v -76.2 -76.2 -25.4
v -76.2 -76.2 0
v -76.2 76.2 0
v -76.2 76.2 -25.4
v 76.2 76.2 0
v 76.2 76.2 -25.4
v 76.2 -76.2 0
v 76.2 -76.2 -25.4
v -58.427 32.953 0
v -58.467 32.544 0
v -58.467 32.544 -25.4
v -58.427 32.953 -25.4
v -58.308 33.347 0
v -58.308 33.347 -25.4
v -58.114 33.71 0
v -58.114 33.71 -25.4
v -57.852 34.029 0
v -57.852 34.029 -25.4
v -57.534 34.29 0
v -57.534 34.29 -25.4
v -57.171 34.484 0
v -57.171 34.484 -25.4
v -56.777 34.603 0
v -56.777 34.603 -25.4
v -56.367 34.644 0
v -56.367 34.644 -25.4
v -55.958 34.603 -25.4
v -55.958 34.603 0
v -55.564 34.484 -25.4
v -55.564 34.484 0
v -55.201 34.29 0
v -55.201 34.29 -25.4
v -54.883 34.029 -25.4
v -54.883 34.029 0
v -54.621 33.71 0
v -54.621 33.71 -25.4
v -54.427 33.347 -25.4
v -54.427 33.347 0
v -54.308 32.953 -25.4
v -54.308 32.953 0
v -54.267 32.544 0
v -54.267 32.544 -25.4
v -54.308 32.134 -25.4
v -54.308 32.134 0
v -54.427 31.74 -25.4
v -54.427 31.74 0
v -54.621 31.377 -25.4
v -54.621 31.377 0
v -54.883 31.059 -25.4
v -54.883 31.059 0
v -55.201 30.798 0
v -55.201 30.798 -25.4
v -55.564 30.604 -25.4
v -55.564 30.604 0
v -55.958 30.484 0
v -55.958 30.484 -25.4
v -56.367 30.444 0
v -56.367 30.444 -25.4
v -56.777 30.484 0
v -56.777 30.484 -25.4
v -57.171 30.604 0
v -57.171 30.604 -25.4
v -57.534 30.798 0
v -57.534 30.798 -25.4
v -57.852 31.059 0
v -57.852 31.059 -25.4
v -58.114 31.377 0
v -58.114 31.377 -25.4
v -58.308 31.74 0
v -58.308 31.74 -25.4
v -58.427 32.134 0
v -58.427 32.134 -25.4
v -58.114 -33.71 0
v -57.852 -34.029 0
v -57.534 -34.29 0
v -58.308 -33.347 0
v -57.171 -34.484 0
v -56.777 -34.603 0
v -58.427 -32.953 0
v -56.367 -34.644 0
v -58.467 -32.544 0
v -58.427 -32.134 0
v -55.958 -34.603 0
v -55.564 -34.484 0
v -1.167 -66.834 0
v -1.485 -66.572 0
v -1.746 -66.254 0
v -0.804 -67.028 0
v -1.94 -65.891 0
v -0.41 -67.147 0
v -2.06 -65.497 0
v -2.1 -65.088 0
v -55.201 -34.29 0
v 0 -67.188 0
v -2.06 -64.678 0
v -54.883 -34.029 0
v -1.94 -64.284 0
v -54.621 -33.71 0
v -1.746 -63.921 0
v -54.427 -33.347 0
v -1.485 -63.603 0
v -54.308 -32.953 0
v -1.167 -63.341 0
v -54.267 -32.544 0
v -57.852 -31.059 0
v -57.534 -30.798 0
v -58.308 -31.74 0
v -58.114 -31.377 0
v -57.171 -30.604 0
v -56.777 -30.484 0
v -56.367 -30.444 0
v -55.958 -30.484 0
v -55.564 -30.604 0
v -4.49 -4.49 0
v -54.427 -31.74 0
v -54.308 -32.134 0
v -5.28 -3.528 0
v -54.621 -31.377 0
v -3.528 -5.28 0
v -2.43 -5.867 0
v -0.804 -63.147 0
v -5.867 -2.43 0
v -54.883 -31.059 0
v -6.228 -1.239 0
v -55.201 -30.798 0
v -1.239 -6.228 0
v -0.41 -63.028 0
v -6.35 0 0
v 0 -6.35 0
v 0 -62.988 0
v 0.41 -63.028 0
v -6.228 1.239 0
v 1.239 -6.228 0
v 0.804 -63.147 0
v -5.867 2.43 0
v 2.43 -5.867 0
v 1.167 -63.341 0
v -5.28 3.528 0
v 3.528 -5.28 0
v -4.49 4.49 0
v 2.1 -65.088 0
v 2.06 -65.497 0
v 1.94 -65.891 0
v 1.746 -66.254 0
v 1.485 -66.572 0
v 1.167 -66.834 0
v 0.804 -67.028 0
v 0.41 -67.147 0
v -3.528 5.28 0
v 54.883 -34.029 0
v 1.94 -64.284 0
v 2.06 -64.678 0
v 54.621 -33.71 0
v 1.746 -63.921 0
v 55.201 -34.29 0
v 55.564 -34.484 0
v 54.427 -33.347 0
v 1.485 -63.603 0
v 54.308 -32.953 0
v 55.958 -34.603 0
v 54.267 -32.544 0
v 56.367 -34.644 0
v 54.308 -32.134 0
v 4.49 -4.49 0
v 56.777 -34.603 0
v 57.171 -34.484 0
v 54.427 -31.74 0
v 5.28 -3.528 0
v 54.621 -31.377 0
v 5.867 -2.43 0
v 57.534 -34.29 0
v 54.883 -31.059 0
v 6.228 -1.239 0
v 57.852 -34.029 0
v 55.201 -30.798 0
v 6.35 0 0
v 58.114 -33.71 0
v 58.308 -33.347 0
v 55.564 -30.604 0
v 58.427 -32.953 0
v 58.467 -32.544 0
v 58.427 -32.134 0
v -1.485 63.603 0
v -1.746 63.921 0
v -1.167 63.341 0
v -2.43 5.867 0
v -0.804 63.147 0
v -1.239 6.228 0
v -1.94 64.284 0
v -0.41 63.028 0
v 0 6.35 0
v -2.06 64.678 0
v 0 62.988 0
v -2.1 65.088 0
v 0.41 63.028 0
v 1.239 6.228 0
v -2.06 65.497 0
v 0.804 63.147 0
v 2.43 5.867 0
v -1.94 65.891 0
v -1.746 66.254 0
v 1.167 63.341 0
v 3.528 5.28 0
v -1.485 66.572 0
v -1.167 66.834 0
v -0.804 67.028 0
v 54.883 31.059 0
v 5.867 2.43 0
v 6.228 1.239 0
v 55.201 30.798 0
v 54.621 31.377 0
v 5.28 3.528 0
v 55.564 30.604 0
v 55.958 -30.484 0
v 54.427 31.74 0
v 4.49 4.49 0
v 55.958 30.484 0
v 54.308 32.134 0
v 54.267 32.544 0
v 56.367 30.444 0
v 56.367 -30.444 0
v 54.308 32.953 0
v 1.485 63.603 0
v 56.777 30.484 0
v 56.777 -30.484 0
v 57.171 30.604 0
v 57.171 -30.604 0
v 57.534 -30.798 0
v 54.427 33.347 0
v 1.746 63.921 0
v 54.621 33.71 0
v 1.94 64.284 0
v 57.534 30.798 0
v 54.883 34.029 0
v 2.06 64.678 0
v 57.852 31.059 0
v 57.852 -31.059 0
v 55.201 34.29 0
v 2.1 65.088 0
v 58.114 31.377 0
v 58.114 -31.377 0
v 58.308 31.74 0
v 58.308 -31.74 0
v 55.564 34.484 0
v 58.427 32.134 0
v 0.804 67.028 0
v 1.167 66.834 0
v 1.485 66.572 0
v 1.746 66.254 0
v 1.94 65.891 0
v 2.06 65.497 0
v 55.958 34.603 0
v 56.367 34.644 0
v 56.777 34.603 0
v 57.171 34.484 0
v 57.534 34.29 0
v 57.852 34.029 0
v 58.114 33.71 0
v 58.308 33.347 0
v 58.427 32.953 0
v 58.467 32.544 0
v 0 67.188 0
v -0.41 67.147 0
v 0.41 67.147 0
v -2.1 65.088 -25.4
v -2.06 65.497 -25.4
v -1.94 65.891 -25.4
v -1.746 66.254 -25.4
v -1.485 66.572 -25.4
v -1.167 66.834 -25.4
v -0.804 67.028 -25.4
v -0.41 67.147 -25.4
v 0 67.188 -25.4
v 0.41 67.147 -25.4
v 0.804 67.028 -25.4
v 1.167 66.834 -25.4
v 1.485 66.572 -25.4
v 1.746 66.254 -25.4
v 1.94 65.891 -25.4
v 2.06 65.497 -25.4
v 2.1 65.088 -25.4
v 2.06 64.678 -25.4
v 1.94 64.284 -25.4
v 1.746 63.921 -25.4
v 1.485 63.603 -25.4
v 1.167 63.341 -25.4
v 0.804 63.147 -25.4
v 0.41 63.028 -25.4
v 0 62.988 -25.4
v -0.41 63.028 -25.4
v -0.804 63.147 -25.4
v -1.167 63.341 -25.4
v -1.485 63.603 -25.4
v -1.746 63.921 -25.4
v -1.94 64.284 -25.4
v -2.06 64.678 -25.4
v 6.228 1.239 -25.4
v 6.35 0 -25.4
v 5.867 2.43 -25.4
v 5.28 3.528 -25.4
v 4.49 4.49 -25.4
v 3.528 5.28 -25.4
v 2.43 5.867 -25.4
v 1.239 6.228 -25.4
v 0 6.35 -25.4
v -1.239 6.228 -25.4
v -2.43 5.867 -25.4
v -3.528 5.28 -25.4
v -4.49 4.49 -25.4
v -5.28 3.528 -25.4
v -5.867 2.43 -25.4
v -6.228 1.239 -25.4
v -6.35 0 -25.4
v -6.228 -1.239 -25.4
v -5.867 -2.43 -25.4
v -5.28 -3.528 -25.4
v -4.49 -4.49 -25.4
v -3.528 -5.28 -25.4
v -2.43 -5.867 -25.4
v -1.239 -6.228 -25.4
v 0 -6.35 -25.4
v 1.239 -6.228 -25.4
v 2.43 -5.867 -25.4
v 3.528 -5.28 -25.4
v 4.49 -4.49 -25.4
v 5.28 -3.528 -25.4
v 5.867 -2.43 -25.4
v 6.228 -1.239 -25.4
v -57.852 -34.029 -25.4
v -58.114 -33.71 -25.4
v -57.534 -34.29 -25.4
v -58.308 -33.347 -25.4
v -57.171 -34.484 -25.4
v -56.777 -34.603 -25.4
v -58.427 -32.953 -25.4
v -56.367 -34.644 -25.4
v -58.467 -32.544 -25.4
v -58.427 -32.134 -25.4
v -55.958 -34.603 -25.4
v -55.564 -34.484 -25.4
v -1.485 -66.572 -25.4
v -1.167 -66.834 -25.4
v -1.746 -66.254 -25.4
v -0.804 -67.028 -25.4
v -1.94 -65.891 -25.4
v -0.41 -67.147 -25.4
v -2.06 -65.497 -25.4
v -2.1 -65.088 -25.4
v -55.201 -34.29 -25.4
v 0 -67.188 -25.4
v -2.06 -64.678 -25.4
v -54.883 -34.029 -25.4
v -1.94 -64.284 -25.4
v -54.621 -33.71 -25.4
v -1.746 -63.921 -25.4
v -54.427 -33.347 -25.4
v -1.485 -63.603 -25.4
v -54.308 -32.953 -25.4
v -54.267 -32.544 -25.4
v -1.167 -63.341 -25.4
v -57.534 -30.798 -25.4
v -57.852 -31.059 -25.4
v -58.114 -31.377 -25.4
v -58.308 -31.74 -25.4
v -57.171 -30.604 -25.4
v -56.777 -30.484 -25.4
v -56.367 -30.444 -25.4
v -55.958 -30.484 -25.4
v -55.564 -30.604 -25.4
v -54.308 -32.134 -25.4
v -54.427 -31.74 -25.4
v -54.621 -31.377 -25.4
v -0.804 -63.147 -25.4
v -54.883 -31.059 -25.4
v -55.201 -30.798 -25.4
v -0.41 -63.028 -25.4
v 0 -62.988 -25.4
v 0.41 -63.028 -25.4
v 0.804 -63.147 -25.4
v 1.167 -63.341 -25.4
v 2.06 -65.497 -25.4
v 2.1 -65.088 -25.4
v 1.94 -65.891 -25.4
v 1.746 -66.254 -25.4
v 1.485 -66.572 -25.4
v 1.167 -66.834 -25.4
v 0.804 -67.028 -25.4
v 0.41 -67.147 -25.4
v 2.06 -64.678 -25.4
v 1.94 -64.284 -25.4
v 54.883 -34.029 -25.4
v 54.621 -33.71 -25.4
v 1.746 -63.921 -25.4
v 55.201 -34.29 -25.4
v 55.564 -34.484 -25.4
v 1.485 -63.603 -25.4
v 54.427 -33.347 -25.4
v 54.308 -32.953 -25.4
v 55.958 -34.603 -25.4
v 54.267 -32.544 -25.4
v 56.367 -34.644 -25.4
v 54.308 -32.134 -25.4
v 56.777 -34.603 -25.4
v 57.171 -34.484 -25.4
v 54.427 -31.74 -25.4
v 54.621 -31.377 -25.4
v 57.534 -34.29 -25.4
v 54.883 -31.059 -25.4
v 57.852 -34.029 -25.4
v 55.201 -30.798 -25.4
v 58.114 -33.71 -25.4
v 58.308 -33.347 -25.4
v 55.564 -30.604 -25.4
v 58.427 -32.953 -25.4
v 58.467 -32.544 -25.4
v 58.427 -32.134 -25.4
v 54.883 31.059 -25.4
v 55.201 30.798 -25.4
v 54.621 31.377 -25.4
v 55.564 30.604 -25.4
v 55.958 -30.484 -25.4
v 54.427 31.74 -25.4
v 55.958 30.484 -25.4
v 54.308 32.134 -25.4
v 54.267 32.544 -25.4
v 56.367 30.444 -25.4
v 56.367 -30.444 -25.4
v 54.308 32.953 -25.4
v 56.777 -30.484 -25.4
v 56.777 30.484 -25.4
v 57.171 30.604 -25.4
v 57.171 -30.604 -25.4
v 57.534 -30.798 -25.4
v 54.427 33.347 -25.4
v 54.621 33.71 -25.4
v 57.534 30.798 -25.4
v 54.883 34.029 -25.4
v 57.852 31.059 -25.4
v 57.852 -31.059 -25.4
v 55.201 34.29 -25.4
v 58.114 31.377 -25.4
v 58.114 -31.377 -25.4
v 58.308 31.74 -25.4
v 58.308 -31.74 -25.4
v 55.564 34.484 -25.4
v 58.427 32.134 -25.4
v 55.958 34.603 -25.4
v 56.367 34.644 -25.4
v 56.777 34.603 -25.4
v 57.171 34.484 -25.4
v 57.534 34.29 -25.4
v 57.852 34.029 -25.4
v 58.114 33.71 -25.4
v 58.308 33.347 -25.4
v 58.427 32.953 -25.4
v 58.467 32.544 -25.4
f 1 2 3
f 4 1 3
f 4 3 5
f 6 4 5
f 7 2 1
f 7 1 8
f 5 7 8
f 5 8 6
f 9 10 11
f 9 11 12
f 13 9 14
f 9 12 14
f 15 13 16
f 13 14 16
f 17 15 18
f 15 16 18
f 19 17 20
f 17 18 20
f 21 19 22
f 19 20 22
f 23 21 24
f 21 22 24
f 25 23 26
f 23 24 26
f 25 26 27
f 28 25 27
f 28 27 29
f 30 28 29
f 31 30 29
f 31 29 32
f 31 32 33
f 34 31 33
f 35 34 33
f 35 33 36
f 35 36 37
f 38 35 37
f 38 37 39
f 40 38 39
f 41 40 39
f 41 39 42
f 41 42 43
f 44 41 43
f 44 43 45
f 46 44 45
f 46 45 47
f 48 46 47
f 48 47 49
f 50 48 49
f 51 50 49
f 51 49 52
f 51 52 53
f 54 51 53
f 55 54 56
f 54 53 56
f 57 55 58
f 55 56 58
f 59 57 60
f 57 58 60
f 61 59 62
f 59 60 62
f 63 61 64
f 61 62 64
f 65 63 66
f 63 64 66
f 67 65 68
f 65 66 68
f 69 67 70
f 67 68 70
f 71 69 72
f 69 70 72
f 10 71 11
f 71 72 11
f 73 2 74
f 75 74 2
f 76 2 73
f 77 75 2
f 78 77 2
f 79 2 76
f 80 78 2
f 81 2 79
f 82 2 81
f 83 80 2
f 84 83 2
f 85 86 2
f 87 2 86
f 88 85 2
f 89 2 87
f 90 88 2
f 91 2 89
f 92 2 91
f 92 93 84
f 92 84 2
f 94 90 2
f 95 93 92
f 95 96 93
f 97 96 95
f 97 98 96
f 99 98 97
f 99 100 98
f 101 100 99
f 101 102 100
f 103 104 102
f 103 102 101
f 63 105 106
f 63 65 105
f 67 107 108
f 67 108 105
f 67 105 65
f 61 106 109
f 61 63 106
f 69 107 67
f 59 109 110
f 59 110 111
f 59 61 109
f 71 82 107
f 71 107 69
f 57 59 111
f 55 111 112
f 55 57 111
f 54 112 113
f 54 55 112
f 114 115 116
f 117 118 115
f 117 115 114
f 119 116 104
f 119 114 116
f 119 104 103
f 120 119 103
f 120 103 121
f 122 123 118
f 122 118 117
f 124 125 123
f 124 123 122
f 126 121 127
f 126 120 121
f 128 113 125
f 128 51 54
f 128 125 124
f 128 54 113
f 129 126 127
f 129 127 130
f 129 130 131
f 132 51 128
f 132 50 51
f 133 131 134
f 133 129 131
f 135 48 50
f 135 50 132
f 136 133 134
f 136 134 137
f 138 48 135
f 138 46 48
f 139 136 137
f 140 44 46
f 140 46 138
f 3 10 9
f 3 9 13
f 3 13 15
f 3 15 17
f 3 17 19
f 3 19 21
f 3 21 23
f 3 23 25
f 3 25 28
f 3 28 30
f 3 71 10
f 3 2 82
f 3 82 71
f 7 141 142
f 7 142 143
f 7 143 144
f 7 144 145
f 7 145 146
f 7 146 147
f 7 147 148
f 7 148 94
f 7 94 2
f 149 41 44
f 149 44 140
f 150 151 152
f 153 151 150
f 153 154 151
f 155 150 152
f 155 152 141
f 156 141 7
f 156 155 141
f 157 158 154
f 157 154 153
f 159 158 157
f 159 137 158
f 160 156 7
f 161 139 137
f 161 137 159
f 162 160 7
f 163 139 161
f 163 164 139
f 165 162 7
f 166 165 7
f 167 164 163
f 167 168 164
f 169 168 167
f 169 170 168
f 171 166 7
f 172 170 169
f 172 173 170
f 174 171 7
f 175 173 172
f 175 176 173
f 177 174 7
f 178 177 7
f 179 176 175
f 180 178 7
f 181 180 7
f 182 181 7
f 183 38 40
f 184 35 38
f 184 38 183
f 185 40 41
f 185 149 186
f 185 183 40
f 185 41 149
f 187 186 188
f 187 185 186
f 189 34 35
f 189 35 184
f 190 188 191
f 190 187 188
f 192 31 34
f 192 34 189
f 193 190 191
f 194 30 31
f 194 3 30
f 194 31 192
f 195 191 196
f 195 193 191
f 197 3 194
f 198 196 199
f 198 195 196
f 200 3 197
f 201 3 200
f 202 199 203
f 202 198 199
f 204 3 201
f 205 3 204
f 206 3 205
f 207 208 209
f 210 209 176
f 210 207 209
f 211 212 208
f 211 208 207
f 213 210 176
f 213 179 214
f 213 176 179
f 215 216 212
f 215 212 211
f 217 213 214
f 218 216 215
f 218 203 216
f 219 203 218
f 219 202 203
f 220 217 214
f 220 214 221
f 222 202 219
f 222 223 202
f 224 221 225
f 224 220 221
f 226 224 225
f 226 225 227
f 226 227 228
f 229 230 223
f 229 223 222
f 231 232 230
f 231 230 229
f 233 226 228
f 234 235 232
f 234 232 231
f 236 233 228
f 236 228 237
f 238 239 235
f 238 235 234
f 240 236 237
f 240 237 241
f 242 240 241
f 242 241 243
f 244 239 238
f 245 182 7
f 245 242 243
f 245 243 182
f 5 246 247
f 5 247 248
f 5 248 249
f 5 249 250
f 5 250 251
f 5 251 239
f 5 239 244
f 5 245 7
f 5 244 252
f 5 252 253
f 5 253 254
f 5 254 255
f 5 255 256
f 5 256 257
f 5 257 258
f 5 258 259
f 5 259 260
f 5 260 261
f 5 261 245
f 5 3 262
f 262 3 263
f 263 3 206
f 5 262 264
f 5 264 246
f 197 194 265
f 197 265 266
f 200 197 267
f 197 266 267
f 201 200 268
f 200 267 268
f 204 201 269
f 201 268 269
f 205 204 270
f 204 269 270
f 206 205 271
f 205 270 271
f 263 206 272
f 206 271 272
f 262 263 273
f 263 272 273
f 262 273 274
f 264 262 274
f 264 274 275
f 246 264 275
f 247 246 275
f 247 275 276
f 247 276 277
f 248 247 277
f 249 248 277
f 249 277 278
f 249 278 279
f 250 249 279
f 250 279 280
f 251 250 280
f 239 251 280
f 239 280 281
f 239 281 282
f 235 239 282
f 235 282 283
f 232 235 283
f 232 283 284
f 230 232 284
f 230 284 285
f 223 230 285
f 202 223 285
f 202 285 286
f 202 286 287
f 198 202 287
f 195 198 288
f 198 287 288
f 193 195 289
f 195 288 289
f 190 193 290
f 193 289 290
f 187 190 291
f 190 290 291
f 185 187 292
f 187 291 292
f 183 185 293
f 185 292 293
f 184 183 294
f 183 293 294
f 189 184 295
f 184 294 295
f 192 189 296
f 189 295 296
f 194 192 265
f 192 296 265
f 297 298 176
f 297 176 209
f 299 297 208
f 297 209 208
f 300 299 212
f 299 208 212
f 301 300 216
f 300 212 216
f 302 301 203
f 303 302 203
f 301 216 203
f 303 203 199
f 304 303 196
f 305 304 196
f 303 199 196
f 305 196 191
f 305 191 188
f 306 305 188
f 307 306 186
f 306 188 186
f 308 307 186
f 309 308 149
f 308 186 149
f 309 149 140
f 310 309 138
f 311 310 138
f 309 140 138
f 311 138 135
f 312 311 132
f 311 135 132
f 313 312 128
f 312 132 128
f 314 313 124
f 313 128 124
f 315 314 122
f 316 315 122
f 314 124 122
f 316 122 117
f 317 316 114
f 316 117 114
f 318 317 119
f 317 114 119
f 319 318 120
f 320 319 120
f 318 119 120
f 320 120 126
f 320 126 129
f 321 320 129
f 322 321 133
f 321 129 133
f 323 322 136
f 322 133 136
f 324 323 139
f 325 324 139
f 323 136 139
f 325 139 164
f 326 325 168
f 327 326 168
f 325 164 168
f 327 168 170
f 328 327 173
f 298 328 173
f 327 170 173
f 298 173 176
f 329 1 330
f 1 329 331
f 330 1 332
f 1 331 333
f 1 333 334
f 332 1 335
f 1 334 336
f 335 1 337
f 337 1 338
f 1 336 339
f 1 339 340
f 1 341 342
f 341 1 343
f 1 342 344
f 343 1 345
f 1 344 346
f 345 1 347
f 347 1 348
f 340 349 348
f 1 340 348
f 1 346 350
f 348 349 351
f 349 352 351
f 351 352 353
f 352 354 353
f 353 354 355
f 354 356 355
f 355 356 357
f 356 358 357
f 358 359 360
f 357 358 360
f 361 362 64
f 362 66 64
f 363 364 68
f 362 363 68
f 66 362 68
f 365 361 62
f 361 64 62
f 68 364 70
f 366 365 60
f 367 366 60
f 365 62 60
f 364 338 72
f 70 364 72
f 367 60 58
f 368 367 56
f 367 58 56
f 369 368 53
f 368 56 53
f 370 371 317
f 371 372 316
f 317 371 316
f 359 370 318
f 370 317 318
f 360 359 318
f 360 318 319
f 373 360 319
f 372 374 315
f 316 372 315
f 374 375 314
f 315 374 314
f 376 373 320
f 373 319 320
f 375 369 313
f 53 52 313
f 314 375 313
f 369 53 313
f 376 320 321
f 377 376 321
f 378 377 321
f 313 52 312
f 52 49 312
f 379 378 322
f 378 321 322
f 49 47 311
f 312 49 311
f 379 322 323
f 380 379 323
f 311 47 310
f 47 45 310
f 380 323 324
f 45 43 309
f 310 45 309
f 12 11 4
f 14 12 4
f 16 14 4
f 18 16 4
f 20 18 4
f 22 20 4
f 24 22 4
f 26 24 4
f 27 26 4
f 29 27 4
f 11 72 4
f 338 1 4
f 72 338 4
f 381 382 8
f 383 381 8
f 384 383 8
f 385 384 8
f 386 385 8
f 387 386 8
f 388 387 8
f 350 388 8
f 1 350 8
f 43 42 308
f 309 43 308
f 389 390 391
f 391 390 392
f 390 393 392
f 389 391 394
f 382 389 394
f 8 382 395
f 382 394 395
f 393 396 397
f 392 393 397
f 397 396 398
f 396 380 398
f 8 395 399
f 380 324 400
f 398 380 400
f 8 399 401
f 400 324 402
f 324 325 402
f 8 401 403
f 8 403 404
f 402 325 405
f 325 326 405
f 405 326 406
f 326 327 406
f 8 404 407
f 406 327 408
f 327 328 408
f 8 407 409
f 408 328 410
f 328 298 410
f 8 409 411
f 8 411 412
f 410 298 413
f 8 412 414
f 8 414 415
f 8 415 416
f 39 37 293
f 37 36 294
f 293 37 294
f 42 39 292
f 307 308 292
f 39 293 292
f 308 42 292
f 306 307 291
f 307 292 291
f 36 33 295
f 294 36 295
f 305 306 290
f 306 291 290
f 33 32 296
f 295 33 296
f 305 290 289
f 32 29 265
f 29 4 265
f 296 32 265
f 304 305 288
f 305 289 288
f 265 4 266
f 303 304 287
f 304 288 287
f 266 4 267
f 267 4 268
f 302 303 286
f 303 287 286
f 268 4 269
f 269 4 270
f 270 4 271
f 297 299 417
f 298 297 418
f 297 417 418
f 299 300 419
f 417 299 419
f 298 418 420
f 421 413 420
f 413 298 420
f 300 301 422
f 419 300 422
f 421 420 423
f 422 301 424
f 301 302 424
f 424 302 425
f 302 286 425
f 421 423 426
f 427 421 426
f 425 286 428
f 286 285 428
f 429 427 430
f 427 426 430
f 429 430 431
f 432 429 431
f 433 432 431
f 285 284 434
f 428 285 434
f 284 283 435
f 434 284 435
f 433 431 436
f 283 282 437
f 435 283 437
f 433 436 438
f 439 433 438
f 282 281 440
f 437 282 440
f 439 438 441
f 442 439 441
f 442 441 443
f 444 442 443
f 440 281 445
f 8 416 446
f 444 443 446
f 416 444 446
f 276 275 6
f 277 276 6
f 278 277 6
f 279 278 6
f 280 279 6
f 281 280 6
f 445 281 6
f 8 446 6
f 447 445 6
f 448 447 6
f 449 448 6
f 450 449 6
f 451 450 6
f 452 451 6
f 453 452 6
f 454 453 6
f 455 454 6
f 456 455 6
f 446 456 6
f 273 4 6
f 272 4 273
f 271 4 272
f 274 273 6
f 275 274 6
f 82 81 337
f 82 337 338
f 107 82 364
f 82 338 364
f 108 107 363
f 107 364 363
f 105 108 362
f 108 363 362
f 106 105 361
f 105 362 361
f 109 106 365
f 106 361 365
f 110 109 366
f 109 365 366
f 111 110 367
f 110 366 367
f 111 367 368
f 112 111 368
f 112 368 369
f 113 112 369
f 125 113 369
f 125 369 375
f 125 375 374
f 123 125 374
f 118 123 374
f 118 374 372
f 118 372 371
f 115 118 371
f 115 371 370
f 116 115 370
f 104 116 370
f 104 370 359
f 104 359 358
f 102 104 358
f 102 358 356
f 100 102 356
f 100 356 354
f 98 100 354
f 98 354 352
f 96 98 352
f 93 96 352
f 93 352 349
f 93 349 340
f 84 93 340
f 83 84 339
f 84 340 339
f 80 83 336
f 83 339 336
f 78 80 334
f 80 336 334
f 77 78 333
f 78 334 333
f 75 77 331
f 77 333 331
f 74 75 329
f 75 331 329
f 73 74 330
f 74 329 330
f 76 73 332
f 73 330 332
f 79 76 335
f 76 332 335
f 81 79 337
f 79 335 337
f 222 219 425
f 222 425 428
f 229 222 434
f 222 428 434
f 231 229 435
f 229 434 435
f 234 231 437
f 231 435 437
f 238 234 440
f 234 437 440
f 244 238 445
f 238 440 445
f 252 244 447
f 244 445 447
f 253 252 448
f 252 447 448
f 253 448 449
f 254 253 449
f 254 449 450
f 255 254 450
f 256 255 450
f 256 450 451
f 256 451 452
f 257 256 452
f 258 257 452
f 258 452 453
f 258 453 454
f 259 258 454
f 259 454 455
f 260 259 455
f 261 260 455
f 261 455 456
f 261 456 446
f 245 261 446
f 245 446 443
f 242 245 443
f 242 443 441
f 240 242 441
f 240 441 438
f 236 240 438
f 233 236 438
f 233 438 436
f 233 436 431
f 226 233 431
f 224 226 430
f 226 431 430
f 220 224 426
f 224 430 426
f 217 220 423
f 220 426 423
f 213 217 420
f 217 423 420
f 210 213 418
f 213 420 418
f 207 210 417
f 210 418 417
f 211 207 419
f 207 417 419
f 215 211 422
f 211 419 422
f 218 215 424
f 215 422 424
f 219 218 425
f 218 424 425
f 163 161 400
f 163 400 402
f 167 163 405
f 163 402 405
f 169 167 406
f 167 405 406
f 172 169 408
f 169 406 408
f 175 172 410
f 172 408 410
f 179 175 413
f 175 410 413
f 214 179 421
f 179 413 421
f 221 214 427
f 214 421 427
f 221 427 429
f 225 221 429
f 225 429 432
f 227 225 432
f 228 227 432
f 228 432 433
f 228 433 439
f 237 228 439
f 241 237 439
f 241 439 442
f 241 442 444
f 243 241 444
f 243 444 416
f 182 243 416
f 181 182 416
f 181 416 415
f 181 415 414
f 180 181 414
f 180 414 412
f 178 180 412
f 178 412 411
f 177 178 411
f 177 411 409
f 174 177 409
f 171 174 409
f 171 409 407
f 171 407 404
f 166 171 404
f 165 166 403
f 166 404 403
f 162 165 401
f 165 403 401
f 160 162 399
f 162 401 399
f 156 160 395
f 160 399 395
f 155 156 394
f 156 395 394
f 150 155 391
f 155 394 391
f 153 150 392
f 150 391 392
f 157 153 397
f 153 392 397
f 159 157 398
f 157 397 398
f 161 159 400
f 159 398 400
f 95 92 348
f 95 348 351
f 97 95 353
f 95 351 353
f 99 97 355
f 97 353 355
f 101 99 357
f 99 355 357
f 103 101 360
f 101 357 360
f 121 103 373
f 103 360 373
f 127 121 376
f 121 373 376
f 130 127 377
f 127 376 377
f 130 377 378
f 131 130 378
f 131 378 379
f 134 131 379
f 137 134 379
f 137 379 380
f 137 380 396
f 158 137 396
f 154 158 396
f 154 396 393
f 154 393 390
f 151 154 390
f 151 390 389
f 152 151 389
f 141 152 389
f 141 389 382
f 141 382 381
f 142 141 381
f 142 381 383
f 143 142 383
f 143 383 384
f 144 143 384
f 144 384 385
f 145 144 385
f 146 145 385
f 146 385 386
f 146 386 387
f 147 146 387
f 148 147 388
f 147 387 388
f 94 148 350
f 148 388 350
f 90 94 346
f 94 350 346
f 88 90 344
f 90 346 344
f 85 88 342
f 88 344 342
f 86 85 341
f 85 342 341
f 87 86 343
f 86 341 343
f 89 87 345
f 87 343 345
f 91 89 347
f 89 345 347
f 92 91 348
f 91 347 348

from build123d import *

# Parameters (mm, degrees)
F0_W     = 152.4
F0_H     = 152.4
F0_R     = 6.35
F1_DEPTH = 25.4
F2_D     = 4.2


with BuildPart() as f1:
    # F0 (on Top) → F1 (new body)
    with BuildSketch(Plane.XY):
        Rectangle(F0_W, F0_H)
        Circle(F0_R, mode=Mode.SUBTRACT)
    extrude(amount=-F1_DEPTH)

    # F2 (through all)
    with Locations(Plane.XY):
        with Locations((0, 65.0875), (-56.3674284688, 32.54375), (-56.3674284688, -32.54375), (0, -65.0875), (56.3674284688, -32.54375), (56.3674284688, 32.54375)):
            Hole(F2_D / 2)


solid = f1.part
